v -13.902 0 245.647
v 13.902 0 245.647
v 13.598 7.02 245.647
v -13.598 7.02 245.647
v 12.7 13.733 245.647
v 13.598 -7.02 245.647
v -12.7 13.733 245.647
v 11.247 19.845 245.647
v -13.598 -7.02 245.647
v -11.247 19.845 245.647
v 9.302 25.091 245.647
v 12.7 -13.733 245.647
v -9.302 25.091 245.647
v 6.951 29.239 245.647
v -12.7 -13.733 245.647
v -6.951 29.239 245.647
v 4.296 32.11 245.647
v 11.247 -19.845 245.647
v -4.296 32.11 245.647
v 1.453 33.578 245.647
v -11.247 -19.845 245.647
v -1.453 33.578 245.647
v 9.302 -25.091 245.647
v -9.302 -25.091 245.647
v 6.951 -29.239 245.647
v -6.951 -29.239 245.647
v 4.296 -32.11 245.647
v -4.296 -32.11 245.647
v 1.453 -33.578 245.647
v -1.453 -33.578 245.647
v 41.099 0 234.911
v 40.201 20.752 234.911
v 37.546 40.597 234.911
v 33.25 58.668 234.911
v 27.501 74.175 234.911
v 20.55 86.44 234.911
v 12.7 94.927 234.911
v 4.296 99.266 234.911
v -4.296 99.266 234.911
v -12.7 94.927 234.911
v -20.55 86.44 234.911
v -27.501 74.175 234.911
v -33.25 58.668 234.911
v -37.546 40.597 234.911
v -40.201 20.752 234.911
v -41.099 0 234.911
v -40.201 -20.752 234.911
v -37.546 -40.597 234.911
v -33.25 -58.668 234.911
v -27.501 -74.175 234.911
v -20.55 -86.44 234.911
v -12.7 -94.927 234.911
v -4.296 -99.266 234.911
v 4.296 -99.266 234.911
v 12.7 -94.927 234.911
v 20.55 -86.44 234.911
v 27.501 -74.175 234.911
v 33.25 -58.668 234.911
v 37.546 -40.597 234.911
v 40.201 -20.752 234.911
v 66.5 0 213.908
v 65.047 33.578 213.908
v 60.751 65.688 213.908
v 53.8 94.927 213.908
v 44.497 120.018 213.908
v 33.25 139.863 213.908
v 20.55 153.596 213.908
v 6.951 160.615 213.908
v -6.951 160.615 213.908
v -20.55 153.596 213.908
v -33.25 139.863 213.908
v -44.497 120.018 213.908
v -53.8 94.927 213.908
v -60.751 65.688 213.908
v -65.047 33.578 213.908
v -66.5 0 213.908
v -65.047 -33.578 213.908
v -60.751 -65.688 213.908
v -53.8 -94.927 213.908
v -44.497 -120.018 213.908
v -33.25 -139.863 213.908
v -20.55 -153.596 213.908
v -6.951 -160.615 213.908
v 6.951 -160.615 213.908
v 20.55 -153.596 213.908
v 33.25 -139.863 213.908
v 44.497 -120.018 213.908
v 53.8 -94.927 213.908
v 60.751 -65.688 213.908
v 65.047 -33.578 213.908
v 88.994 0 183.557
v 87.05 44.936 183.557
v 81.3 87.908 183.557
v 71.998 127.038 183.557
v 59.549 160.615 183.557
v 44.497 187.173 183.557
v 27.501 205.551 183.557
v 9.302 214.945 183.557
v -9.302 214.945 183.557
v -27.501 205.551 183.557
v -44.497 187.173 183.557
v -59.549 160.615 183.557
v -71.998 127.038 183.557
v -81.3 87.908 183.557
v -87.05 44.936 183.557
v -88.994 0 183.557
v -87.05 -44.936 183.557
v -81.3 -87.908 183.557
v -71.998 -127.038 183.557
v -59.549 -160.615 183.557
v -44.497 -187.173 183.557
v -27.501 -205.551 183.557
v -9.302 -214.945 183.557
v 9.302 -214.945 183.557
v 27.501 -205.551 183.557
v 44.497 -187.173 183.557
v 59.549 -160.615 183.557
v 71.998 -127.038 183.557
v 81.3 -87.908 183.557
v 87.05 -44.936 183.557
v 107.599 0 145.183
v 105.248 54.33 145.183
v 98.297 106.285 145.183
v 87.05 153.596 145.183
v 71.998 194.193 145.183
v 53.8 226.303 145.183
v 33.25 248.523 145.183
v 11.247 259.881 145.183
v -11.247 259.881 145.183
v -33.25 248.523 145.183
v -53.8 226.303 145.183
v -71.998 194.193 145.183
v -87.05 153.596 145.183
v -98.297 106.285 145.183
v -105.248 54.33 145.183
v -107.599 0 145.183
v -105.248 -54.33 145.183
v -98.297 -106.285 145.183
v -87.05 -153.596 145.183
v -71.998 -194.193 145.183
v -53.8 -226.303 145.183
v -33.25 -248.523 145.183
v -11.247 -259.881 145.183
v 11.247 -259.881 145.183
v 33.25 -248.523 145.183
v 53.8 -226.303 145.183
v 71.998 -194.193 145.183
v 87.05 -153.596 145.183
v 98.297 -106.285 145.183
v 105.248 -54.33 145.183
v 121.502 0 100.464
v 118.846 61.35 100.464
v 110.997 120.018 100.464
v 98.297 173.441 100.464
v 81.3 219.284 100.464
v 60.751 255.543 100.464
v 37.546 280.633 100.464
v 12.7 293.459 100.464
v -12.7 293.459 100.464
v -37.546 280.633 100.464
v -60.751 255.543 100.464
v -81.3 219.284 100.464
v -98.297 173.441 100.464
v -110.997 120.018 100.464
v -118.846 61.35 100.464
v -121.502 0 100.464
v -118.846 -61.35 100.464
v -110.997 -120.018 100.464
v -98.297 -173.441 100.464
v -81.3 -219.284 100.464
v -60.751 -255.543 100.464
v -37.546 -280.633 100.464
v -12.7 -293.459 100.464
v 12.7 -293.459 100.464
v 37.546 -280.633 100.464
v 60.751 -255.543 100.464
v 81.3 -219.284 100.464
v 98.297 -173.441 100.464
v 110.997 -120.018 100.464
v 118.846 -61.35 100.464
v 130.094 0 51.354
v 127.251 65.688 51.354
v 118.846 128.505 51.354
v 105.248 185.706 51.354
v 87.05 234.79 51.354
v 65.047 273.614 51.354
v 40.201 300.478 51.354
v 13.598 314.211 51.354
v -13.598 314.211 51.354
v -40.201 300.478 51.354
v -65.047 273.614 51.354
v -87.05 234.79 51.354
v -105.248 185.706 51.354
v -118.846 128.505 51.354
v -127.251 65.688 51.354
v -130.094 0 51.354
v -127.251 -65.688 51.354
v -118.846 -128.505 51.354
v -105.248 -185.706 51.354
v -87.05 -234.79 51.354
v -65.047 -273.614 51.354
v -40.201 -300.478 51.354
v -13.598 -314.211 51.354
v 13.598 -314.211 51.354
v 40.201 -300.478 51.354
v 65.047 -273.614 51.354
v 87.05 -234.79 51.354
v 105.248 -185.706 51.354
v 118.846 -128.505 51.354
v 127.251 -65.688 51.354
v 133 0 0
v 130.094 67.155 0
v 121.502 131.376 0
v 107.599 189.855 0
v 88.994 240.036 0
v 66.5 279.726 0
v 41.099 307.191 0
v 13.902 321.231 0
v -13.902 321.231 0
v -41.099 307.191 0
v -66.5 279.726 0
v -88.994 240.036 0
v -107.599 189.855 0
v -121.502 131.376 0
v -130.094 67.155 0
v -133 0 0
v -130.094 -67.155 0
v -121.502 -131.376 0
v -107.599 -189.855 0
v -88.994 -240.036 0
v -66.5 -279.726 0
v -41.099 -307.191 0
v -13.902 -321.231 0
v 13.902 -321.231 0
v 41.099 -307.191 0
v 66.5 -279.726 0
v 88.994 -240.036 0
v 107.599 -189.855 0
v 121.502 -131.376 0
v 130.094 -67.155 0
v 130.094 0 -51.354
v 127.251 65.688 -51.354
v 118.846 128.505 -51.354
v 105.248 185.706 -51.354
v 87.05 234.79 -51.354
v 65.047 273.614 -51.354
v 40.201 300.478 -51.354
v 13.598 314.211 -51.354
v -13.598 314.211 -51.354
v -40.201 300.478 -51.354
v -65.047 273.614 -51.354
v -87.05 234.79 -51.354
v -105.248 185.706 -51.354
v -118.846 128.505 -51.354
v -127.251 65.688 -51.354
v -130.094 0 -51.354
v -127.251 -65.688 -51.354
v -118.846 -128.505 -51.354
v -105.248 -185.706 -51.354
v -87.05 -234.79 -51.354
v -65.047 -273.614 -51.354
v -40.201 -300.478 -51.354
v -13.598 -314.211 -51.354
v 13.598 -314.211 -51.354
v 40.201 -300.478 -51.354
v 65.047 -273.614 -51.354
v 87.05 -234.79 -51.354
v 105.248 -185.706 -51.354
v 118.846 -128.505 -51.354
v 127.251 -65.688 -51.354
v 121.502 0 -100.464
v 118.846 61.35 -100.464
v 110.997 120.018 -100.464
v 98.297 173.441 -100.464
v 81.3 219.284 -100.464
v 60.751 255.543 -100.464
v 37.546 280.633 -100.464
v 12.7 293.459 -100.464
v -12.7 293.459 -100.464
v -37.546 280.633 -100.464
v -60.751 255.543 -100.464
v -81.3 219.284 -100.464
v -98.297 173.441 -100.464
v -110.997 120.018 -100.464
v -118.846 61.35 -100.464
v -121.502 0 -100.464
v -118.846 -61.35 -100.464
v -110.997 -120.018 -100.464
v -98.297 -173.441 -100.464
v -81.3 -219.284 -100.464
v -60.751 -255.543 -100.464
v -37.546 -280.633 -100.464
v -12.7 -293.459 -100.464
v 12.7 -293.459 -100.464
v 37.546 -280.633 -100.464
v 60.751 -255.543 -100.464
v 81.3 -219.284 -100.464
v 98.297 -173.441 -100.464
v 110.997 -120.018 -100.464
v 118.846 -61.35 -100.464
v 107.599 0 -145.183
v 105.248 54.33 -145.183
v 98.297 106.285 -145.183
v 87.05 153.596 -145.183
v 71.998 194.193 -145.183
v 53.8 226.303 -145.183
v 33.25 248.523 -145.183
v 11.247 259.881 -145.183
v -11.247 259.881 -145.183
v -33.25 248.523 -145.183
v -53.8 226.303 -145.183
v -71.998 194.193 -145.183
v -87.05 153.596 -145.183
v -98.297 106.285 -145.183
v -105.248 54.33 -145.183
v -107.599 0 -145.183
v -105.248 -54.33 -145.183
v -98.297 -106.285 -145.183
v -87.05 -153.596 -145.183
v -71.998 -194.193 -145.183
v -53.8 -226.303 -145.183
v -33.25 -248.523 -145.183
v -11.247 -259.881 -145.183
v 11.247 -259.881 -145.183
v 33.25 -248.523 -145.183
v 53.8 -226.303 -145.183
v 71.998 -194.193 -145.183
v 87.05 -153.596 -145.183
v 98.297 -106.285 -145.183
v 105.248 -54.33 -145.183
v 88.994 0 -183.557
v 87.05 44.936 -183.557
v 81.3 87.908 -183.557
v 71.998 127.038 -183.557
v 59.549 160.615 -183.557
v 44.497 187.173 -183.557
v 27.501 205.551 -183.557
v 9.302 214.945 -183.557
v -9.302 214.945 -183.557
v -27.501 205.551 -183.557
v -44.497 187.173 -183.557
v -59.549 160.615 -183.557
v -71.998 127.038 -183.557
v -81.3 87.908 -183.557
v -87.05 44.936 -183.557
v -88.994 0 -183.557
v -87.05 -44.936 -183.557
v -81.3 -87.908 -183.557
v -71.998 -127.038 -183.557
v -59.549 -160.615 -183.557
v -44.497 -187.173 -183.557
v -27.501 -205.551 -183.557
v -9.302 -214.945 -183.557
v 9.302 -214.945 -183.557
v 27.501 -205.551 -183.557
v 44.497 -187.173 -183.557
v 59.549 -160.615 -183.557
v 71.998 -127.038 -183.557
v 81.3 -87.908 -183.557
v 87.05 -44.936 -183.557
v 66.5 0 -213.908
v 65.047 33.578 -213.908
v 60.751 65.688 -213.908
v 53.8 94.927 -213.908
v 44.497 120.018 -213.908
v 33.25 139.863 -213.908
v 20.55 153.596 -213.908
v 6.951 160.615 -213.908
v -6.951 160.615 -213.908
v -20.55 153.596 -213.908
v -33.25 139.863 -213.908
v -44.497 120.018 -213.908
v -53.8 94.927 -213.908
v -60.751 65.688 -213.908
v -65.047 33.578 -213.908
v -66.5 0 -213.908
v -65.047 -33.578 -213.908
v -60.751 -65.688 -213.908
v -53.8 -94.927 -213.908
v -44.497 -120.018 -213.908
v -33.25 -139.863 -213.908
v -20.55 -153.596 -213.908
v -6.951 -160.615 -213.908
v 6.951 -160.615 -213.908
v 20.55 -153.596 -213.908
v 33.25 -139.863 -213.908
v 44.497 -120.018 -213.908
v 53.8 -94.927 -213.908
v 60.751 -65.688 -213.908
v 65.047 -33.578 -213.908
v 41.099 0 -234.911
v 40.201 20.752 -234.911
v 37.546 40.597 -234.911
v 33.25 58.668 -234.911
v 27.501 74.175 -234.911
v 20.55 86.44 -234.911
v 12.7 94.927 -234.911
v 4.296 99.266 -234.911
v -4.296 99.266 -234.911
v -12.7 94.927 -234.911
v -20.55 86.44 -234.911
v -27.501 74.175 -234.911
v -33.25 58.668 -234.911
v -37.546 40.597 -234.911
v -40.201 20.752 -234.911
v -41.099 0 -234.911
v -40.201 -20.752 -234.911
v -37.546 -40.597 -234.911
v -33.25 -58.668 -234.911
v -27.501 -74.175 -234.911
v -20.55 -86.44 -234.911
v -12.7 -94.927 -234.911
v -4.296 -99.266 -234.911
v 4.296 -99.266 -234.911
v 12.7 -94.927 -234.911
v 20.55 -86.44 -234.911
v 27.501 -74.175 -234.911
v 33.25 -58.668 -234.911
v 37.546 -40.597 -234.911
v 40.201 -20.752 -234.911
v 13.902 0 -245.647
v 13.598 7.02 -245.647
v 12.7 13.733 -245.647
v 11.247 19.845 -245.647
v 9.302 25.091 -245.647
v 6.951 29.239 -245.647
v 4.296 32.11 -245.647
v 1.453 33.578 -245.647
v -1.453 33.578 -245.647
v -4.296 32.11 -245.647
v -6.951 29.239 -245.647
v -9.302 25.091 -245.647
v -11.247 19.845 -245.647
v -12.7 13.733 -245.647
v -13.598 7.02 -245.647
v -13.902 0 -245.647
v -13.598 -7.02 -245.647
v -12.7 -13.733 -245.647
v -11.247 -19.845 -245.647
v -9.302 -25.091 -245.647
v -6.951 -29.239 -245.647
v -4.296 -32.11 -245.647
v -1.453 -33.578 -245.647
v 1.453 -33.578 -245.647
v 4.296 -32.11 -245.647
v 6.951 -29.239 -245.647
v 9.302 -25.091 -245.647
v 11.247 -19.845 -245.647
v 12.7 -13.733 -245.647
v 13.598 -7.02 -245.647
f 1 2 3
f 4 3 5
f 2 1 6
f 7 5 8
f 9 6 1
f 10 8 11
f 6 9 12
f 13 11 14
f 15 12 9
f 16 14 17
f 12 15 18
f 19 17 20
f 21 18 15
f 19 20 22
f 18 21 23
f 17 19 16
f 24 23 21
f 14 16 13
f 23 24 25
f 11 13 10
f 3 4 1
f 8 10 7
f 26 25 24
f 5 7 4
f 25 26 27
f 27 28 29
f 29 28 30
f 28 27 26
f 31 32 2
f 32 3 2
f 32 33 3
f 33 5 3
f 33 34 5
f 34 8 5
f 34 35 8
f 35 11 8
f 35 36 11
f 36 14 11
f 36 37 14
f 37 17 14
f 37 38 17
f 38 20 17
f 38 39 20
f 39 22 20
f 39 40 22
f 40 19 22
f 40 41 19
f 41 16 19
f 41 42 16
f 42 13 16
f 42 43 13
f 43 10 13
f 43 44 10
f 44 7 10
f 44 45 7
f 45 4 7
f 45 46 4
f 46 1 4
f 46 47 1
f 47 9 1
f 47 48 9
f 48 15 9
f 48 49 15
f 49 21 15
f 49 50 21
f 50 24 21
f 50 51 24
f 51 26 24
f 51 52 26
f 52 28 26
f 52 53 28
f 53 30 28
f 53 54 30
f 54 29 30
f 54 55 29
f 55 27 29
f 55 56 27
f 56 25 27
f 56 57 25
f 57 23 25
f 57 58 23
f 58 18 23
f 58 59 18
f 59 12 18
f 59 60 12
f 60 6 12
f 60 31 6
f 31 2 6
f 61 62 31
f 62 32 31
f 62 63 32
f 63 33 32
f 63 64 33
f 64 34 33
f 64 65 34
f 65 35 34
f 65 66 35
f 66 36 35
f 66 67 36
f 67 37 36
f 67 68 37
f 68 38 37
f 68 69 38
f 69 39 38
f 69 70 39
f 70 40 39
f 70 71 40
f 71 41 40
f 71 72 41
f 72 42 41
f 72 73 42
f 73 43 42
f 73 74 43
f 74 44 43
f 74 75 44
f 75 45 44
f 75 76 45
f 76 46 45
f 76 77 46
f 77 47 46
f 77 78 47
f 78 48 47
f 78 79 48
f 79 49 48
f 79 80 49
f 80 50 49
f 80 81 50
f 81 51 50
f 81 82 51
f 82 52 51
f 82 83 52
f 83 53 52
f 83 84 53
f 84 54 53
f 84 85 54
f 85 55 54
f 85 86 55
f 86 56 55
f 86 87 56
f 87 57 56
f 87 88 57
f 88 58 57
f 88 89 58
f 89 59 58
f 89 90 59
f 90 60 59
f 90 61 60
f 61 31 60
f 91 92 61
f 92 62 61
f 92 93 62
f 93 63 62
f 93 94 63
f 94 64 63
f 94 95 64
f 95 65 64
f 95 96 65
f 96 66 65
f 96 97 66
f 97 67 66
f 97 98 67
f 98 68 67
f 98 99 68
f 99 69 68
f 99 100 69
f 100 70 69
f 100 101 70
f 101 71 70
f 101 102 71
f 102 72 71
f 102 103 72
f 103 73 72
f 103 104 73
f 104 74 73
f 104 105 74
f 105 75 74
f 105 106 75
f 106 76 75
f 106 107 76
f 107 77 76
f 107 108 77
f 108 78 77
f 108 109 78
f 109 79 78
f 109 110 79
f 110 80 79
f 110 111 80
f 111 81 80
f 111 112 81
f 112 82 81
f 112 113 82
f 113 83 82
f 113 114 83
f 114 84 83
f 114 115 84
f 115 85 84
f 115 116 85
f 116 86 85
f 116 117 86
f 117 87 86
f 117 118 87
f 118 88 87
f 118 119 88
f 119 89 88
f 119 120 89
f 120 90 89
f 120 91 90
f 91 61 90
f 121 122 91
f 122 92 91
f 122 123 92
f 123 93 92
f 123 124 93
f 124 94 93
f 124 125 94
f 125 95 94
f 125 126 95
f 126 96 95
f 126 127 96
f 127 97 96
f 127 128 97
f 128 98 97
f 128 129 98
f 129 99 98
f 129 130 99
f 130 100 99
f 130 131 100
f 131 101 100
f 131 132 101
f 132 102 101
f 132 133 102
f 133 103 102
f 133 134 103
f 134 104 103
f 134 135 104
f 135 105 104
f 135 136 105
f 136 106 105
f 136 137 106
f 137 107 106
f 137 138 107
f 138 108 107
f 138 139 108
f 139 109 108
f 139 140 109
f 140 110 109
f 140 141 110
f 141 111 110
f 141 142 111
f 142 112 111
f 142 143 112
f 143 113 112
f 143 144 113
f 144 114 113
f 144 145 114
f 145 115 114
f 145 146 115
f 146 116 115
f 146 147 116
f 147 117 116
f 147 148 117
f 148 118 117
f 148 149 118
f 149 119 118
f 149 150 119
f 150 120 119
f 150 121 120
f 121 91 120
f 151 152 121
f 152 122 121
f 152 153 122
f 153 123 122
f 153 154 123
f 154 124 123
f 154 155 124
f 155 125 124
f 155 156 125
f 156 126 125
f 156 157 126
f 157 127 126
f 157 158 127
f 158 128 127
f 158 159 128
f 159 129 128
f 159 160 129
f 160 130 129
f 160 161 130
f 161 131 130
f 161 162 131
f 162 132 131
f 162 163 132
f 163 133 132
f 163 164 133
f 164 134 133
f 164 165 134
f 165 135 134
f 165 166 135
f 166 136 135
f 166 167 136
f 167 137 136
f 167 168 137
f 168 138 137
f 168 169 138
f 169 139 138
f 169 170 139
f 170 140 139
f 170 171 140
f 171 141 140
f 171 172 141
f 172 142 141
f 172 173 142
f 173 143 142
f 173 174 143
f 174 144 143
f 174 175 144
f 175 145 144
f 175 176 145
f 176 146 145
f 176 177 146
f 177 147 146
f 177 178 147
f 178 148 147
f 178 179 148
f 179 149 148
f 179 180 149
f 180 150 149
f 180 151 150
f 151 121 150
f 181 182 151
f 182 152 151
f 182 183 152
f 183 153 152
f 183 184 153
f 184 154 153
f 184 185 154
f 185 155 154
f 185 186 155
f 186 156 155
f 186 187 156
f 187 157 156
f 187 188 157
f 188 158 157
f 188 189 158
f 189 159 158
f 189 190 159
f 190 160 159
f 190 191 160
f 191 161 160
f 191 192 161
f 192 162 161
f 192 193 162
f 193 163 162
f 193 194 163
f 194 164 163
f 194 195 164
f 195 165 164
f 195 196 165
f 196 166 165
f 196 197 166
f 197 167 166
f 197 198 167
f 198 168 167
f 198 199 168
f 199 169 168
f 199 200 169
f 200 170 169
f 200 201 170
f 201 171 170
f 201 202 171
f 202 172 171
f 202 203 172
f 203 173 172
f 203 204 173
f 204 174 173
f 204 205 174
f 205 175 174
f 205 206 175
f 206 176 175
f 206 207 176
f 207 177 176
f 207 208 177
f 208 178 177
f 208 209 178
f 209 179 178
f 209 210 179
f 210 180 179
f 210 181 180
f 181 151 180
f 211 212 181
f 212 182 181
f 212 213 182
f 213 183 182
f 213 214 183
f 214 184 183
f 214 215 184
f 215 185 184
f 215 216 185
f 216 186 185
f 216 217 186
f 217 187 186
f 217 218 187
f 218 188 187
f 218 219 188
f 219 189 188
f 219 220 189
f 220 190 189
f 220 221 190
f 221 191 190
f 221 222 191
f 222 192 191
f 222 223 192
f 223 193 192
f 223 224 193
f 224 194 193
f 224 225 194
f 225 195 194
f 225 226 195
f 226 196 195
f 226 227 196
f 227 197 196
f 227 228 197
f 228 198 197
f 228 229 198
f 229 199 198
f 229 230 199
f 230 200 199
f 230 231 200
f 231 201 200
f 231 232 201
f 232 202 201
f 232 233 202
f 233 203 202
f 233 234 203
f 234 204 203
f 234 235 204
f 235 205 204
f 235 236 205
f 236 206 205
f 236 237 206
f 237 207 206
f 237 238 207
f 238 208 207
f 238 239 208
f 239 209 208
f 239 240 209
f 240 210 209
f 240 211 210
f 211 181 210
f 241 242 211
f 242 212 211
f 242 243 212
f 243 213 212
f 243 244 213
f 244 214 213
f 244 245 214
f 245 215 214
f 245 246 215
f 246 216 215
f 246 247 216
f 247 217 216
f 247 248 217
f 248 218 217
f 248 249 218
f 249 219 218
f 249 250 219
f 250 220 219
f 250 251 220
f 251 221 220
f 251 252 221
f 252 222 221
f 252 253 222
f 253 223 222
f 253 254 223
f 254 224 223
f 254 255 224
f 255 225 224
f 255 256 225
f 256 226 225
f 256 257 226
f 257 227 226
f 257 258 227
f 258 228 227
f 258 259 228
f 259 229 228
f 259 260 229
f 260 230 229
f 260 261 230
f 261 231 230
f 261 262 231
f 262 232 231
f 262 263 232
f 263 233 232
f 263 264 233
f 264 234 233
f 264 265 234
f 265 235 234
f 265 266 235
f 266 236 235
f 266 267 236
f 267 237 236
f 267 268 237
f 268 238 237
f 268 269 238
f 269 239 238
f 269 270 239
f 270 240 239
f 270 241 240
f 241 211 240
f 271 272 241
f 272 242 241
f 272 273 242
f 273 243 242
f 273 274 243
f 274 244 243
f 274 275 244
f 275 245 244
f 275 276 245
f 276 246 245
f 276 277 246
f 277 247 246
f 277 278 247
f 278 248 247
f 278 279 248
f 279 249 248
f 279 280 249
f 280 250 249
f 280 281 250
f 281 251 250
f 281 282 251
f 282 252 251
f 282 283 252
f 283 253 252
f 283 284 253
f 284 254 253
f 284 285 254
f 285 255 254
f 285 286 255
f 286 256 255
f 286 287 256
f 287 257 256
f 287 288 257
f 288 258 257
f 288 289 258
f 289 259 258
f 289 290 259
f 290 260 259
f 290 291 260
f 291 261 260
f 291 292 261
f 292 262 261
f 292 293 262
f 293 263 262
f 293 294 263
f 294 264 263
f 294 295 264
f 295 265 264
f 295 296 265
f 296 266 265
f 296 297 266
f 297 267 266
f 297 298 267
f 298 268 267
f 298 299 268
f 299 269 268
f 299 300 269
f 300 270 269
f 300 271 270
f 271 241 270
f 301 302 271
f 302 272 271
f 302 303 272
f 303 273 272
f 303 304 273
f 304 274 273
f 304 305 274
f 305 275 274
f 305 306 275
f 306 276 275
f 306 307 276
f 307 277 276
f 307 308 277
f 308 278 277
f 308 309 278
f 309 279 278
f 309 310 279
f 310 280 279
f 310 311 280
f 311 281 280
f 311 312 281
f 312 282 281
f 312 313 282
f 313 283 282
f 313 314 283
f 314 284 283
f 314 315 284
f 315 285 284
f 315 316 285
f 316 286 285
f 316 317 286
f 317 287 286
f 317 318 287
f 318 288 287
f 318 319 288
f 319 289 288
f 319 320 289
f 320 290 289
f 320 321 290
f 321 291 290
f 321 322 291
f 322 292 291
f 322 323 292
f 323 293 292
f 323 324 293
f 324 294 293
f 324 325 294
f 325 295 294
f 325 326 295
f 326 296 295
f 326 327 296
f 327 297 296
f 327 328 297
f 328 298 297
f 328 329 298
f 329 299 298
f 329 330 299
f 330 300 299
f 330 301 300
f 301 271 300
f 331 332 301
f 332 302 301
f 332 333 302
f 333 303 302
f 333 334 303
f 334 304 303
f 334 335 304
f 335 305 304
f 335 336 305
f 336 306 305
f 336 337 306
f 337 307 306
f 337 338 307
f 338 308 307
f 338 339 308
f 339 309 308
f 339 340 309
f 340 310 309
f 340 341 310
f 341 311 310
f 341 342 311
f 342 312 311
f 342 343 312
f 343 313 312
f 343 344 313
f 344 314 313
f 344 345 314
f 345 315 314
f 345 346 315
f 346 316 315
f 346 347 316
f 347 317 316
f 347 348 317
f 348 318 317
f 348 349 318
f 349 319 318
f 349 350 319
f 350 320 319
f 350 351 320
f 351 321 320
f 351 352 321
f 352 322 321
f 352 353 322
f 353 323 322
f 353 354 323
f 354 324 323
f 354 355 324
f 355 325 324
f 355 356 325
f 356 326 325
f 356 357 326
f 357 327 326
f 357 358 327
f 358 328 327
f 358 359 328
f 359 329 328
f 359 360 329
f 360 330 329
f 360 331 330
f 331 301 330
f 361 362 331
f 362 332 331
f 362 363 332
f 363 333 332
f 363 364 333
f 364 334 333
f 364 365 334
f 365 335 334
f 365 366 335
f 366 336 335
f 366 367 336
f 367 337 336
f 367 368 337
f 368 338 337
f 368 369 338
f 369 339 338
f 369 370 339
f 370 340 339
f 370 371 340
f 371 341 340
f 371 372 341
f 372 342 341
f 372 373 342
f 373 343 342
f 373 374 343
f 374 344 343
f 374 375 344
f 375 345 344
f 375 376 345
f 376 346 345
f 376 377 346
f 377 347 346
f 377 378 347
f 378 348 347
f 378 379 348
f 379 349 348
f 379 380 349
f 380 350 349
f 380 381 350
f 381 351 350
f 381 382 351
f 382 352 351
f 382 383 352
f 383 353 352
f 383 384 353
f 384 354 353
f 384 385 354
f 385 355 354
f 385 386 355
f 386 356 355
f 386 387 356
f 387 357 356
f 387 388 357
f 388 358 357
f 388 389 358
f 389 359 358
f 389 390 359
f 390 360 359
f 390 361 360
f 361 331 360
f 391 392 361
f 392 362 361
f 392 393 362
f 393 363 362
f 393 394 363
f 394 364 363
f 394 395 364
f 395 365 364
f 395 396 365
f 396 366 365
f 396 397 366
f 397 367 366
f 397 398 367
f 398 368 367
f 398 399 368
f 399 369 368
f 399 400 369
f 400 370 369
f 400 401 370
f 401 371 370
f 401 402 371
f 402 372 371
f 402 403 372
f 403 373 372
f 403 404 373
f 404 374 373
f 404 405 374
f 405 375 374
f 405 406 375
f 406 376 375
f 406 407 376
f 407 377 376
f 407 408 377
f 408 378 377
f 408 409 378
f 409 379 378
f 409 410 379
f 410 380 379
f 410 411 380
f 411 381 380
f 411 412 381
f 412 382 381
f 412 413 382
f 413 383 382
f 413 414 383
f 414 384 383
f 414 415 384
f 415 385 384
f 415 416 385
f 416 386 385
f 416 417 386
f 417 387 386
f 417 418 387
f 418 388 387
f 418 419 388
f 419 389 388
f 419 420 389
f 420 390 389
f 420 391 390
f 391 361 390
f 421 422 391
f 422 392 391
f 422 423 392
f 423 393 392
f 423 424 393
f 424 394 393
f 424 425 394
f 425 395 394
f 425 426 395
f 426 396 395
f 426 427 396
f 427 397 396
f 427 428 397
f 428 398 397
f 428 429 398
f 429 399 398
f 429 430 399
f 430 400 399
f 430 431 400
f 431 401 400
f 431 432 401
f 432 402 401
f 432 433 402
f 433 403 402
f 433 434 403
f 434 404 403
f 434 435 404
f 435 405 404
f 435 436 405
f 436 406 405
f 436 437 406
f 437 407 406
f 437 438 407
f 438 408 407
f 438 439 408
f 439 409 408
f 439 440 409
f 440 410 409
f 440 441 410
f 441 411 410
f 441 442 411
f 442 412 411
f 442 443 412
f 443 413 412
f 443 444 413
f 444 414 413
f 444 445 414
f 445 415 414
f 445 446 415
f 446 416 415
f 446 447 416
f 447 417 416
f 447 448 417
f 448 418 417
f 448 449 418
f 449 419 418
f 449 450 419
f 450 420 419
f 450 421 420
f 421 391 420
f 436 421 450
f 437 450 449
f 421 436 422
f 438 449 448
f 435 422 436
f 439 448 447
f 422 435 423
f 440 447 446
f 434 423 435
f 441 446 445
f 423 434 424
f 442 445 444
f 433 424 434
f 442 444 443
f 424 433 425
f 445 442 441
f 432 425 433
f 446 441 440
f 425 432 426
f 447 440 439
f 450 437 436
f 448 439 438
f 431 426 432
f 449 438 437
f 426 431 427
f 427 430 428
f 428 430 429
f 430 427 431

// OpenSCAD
// Generated by SolidPython 1.0.1 on 2020-07-29 00:46:48


scale(v = [7, 17, 13]) {
	sphere(r = 19);
}
/***********************************************
*********      SolidPython code:      **********
************************************************
 
# import packages: SolidPython
from solid import *
from solid.utils import *
from itertools import chain, combinations, permutations


class Resize:

    def __init__(self, scad_file):
        self.scad_file = scad_file
        #self.scad_file = import_scad(scad_file)
        # cone/cylinder param:
        self.r1 = 0
        self.r2 = 0
        self.h = 0
        # rectangular prism param:
        self.w = 0
        self.l = 0
        # ellipse param:
        self.r = 0

    # import OpenScad code (file name corresponds to shape)


    # classify shape + parameters
    def assign(self, param1, param2, param3):
        if self.scad_file == 'cone.scad':
            self.r1 = param1
            self.r2 = param2
            self.h = param3
        elif self.scad_file == 'cylinder.scad':
            self.r1 = param1
            self.r2 = param2
            self.h = param3
        elif self.scad_file == 'rectangularPrism.scad':
            self.h = param1
            self.l = param2
            self.w = param3
        else:
            self.r = param1
            self.h = param2

    # resize parameters
    def iterate(self):
        x = range(3, 20, 2)
        i = 1
        if self.scad_file == 'cone.scad':
            tempList = list(permutations(x, 2))
            for temp in tempList:
                param1 = temp[0]
                param2 = temp[1]
                filepath = 'produced_scad_files/' + 'cone' + str(param1) + '_' + str(param2) + '_' + '.scad'
                scad_render_to_file(cylinder(h=param1, r1=param2, r2=0), filepath)

        elif self.scad_file == 'cylinder.scad':
            tempList = list(permutations(x, 3))
            for temp in tempList:
                param1 = temp[0]
                param2 = temp[1]
                filepath = 'produced_scad_files/' + 'cylinder' + str(param1) + '_' + str(param2) + '_' + '.scad'
                scad_render_to_file(cylinder(h=param1, r1=param2, r2=param2), filepath)

        elif self.scad_file == 'rectangularPrism.scad':
            tempList = list(permutations(x, 3))
            for temp in tempList:
                param1 = temp[0]
                param2 = temp[1]
                param3 = temp[2]
                filepath = 'produced_scad_files/' + 'rectangularPrism' + str(param1) + '_' + str(param2) + '_' + str(
                    param3) + '.scad'
                scad_render_to_file(cube(size=(param1, param2, param3)), filepath)

        elif self.scad_file == 'ellipse.scad':
            tempList = list(permutations(x, 4))
            for temp in tempList:
                param1 = temp[0]
                param2 = temp[1]
                param3 = temp[2]
                param4 = temp[3]
                filepath = 'produced_scad_files/' + 'ellipse' + str(param1) + '_' + str(param2) + '_' + str(param3) + '_' + str(param4) + '.scad'
                scad_render_to_file(scale([param1, param2, param3])(sphere(r=param4)), filepath)

    def render_to_scadfile(self):
        scad_render_to_file(scad, 'example.scad') 
 
************************************************/
